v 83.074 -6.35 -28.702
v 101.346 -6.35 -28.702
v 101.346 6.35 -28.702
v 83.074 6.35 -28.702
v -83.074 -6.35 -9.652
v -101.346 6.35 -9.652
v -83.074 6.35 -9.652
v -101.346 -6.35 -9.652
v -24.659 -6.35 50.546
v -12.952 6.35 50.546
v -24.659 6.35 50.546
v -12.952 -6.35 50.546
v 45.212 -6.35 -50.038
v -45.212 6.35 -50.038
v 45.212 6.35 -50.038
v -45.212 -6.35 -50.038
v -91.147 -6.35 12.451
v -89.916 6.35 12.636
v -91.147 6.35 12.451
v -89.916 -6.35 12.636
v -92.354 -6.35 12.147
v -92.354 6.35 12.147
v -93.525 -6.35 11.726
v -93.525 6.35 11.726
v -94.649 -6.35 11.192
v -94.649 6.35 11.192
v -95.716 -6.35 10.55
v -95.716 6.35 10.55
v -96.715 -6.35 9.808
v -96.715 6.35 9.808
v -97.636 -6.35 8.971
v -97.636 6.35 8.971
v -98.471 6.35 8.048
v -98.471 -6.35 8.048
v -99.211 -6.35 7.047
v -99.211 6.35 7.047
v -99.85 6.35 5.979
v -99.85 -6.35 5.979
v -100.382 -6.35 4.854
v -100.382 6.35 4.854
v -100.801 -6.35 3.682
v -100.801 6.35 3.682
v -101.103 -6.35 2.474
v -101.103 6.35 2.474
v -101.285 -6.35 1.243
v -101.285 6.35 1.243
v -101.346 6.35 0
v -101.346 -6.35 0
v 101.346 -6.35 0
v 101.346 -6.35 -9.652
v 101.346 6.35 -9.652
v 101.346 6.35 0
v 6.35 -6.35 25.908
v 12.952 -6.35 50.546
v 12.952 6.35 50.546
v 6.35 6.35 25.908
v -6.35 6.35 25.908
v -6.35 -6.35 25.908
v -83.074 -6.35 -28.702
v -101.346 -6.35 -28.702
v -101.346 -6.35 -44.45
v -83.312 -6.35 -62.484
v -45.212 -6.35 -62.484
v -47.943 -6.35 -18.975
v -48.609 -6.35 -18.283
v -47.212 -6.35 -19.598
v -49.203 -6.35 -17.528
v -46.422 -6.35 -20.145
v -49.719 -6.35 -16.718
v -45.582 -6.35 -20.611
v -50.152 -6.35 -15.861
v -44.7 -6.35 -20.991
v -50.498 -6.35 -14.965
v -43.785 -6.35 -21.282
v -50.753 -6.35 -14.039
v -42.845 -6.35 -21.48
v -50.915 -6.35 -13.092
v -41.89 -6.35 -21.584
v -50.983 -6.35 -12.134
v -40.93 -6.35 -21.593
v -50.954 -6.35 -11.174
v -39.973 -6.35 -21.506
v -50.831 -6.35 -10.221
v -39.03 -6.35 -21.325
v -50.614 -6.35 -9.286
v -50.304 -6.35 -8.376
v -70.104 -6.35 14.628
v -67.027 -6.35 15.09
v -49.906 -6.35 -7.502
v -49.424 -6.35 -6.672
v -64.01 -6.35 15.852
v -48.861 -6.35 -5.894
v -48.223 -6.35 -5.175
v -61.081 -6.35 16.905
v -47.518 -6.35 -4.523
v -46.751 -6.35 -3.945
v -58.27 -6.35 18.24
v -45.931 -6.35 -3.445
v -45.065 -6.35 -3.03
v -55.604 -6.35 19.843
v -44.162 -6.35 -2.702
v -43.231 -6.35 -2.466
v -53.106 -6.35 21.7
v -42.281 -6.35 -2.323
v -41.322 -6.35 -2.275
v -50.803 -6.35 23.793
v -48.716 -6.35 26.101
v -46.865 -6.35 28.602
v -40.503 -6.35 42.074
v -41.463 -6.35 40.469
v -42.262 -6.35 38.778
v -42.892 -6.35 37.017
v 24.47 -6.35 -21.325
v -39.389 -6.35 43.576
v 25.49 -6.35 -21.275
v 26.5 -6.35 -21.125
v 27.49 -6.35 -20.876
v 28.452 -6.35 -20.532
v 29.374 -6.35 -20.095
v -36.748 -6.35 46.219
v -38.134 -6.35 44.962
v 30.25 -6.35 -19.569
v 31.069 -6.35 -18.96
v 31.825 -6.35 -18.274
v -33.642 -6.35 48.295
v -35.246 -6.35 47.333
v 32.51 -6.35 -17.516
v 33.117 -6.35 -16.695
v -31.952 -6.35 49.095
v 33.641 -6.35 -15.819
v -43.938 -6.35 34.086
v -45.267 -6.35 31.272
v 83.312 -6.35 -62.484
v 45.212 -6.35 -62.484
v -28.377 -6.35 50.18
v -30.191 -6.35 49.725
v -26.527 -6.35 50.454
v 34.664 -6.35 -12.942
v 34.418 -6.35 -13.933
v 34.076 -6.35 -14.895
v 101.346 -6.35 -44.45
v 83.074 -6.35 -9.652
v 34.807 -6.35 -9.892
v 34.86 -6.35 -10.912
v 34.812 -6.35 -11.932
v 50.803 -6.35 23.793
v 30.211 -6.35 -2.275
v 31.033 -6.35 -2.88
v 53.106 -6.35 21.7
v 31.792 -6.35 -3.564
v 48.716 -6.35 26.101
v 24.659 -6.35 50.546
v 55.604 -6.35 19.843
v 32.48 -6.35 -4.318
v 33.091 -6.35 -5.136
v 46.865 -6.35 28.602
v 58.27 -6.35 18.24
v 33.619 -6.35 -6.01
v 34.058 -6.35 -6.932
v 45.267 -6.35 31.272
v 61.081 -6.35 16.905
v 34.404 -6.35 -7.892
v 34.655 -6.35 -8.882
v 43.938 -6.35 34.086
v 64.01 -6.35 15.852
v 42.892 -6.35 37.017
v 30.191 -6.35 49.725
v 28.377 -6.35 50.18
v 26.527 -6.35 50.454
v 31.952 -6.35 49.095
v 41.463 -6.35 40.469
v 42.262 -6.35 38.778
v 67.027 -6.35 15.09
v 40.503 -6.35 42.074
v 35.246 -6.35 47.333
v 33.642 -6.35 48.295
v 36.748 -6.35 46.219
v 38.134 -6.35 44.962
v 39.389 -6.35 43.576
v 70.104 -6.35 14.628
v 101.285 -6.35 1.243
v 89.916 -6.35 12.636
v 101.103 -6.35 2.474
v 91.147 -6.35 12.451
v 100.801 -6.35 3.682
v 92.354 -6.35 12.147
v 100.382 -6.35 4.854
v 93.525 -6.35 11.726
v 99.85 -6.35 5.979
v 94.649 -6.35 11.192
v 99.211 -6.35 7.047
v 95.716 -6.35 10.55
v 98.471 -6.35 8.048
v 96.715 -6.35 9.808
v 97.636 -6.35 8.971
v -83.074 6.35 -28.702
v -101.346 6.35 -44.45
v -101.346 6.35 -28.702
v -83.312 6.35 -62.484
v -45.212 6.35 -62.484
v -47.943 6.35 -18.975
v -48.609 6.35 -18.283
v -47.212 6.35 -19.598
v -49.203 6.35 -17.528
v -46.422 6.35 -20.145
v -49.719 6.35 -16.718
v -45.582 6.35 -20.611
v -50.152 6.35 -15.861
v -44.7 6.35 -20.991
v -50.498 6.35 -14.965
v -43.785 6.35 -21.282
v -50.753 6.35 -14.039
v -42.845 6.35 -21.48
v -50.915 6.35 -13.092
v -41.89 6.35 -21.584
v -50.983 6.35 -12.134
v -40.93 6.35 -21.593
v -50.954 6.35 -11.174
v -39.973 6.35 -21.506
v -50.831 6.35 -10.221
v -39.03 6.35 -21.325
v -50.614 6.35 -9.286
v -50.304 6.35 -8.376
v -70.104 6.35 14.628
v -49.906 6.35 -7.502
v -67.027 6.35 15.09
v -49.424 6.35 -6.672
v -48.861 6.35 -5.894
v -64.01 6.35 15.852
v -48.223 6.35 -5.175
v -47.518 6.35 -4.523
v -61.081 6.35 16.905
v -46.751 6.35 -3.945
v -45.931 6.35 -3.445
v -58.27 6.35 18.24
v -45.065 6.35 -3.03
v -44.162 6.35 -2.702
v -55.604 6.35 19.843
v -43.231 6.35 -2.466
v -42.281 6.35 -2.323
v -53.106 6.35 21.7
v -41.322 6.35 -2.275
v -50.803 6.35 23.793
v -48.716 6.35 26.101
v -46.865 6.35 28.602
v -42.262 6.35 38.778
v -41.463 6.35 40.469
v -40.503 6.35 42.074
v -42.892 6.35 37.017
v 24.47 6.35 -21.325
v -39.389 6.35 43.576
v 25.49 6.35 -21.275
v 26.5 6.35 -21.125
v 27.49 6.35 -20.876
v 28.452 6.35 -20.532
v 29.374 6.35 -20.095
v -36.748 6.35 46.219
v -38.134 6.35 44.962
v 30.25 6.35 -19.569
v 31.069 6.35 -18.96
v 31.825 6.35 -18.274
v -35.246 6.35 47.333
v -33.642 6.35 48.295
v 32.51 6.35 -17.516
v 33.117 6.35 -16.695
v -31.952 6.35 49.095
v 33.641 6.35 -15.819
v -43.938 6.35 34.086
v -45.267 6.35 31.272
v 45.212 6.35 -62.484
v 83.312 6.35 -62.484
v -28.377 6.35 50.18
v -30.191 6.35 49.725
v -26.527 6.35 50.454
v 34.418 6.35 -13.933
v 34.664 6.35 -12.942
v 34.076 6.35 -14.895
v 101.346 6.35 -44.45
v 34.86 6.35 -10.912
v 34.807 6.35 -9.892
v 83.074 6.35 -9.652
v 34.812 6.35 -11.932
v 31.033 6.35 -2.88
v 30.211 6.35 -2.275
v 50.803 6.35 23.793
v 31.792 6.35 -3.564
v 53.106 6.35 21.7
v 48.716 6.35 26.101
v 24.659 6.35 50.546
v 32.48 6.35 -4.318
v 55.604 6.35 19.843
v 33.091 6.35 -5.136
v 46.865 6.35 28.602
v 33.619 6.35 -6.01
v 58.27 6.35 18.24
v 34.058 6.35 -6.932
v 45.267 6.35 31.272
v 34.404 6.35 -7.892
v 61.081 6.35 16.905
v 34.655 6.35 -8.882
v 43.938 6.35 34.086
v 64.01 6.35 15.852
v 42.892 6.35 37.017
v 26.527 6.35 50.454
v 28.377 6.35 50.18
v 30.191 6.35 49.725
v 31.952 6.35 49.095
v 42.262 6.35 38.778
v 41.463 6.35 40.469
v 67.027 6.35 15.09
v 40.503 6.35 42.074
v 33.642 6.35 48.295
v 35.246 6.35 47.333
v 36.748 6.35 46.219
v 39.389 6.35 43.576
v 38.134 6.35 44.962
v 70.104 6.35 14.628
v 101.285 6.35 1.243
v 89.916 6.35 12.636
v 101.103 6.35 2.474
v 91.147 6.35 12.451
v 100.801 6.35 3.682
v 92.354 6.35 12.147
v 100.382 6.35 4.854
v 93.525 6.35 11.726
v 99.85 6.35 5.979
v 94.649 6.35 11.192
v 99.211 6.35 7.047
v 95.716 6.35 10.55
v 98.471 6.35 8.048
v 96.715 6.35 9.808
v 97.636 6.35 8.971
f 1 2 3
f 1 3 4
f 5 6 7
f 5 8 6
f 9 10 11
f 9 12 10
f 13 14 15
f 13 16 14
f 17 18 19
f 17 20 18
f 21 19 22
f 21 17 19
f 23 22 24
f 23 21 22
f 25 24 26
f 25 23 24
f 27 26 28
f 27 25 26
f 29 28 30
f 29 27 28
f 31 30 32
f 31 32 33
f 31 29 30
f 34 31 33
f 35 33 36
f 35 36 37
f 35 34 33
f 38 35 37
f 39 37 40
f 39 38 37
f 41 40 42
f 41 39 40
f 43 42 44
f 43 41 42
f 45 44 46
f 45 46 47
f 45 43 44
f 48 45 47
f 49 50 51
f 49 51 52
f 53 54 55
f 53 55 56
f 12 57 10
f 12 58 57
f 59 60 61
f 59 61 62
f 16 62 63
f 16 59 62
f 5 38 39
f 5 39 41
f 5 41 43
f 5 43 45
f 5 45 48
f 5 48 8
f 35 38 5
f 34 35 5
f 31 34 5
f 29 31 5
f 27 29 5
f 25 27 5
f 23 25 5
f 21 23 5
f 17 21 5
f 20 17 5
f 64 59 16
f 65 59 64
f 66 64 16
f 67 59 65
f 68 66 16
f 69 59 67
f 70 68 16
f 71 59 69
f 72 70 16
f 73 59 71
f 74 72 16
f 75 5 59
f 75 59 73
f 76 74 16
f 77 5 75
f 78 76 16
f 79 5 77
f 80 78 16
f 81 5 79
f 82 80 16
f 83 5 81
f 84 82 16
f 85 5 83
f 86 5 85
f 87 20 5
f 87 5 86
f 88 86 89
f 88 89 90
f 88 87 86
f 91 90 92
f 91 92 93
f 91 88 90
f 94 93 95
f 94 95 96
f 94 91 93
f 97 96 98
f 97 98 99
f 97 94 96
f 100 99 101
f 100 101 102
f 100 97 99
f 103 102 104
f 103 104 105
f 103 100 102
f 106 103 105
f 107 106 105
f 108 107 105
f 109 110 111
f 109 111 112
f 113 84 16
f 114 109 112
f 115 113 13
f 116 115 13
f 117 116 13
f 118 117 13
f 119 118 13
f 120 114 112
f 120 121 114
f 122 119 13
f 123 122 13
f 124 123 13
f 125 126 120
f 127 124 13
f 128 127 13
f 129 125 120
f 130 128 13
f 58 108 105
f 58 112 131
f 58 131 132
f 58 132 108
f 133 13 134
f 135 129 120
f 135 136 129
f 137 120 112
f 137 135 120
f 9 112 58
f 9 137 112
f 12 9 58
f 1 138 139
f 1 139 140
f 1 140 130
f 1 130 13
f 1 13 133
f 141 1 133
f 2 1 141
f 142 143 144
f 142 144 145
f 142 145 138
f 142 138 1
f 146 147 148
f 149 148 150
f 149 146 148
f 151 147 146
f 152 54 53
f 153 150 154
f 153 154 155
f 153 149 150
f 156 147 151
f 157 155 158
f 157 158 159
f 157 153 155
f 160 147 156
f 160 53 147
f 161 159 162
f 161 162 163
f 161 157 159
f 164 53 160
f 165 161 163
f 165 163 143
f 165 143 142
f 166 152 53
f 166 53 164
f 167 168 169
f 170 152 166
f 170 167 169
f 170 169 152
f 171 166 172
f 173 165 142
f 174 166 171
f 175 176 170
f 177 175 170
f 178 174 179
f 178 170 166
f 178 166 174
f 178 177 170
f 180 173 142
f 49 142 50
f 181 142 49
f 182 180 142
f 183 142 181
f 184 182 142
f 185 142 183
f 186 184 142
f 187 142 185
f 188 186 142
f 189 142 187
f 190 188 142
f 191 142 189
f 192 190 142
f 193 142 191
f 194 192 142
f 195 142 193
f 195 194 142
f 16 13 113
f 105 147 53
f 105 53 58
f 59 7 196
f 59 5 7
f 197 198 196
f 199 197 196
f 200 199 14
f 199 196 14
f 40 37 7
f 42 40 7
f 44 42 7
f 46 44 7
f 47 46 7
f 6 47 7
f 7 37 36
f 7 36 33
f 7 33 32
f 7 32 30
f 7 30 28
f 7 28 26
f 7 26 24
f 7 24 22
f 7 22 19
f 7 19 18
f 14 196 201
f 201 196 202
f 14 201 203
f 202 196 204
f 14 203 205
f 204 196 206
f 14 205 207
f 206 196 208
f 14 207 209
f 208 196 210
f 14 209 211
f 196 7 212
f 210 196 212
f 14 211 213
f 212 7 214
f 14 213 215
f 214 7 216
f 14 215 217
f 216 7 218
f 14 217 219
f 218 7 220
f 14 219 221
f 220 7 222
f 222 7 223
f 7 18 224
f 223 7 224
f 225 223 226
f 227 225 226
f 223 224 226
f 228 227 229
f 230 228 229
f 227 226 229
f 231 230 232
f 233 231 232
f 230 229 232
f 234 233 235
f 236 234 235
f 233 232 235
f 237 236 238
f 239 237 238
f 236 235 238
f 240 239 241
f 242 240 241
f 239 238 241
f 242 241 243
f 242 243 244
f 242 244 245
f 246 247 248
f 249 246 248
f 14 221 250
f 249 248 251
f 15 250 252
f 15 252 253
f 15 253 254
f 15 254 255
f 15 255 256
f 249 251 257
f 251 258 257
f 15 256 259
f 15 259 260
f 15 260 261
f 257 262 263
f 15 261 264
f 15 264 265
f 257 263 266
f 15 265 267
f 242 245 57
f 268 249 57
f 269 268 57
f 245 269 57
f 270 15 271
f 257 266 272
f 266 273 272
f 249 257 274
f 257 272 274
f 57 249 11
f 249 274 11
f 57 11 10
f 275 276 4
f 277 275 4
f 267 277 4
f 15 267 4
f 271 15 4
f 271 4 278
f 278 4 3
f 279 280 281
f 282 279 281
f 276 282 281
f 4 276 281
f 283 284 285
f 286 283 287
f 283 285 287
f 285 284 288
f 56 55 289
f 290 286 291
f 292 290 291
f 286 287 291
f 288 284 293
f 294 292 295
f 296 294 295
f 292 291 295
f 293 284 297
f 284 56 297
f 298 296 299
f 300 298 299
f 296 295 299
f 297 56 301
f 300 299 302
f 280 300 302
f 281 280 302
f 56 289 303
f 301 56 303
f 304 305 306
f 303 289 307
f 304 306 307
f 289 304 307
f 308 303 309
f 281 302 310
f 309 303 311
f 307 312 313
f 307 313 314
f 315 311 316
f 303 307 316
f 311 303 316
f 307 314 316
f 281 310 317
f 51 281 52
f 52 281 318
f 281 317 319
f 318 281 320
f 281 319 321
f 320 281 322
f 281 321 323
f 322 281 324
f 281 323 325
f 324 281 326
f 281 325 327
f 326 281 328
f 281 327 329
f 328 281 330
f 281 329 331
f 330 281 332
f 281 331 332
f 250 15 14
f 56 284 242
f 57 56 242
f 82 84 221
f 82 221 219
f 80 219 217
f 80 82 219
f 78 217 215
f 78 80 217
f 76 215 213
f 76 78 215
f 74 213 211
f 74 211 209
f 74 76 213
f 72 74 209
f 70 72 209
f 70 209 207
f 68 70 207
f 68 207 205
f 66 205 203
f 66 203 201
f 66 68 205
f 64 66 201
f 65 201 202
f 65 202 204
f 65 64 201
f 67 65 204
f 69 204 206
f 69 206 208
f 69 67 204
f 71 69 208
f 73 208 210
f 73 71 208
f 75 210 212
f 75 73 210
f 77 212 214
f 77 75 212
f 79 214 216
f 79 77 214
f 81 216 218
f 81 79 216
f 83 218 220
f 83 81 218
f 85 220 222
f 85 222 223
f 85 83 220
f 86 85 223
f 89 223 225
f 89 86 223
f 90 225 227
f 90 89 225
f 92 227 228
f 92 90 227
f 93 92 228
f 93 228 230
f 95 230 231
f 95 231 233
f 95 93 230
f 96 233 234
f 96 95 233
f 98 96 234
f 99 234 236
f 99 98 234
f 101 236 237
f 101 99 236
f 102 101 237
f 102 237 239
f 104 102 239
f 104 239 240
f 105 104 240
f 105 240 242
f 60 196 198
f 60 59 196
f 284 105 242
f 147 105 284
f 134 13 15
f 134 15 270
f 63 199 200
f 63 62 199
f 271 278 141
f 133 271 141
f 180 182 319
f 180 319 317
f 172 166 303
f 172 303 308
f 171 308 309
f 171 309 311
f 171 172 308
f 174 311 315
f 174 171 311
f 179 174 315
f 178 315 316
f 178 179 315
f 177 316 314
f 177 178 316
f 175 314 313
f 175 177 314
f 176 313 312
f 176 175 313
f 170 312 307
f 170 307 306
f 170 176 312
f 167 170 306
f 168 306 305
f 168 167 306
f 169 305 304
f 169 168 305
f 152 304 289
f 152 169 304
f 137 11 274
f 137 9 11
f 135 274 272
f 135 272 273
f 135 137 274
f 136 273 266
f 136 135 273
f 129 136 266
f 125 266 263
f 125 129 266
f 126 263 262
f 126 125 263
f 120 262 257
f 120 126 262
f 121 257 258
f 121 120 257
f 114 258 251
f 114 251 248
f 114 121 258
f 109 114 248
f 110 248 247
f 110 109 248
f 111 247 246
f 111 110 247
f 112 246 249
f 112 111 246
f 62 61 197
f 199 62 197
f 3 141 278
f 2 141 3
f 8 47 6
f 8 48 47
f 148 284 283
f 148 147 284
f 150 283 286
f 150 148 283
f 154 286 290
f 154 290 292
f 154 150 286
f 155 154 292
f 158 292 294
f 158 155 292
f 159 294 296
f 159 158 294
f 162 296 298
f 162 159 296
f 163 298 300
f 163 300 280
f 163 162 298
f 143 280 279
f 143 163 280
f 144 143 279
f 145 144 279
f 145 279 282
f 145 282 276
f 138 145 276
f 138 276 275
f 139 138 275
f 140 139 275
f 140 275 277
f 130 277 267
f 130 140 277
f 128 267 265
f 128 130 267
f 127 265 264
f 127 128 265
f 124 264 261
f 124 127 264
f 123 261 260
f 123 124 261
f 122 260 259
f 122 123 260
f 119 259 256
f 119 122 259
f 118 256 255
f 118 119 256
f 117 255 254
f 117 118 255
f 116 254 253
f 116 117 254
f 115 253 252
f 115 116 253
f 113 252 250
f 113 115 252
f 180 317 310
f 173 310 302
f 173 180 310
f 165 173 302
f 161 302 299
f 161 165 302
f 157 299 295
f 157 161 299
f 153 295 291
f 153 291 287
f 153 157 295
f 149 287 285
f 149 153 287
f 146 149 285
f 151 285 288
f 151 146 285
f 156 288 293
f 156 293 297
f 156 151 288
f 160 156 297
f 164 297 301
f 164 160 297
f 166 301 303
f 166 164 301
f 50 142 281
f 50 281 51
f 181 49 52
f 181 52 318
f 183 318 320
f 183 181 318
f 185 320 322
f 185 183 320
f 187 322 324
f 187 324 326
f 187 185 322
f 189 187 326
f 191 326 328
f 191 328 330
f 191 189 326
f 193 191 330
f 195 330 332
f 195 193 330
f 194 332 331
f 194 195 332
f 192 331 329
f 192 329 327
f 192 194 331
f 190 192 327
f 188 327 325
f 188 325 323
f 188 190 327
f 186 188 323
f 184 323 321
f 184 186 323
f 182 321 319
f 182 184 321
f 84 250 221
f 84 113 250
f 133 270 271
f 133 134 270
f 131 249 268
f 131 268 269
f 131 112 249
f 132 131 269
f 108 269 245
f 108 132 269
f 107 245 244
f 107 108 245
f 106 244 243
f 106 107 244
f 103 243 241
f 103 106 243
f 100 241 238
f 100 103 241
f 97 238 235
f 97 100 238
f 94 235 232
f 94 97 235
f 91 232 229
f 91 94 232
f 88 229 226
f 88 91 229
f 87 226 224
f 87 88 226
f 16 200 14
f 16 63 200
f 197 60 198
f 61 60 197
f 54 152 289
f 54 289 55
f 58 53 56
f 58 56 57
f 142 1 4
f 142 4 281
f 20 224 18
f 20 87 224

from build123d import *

# Parameters (mm, degrees)
F1_DEPTH = 6.35
F2_SIZE  = 18.034


with BuildPart() as f1:
    # F0 (on Front) → F1 (new body, symmetric)
    with BuildSketch(Plane.XZ):
        with BuildLine():
            Line((-45.212, -50.038), (45.212, -50.038))
            Line((45.212, -50.038), (45.212, -62.484))
            Line((45.212, -62.484), (101.346, -62.484))
            Line((101.346, -62.484), (101.346, -28.702))
            Line((101.346, -28.702), (83.07388, -28.702))
            Line((83.07388, -28.702), (83.07388, -9.652))
            Line((83.07388, -9.652), (101.346, -9.652))
            Line((101.346, -9.652), (101.346, 0))
            ThreePointArc((101.346, 0), (98.064572, 8.519419), (89.916, 12.63634))
            Line((89.916, 12.63634), (70.104, 14.627521))
            ThreePointArc((70.104, 14.627521), (53.106495, 21.700368), (42.891581, 37.01689))
            ThreePointArc((42.891581, 37.01689), (36.010992, 46.794292), (24.65913, 50.546))
            Line((24.65913, 50.546), (12.951732, 50.546))
            Line((12.951732, 50.546), (6.35, 25.908))
            Line((6.35, 25.908), (-6.35, 25.908))
            Line((-6.35, 25.908), (-12.951732, 50.546))
            Line((-12.951732, 50.546), (-24.65913, 50.546))
            ThreePointArc((-24.65913, 50.546), (-36.010992, 46.794292), (-42.891581, 37.01689))
            ThreePointArc((-42.891581, 37.01689), (-53.106495, 21.700368), (-70.104, 14.627521))
            Line((-70.104, 14.627521), (-89.916, 12.63634))
            ThreePointArc((-89.916, 12.63634), (-98.064572, 8.519419), (-101.346, 0))
            Line((-101.346, 0), (-101.346, -9.652))
            Line((-101.346, -9.652), (-83.07388, -9.652))
            Line((-83.07388, -9.652), (-83.07388, -28.702))
            Line((-83.07388, -28.702), (-101.346, -28.702))
            Line((-101.346, -28.702), (-101.346, -62.484))
            Line((-101.346, -62.484), (-45.212, -62.484))
            Line((-45.212, -62.484), (-45.212, -50.038))
        make_face()
        with BuildLine():
            ThreePointArc((-39.029952, -21.325139), (-50.915473, -13.092182), (-41.32179, -2.275139))
            Line((-41.32179, -2.275139), (30.210615, -2.275139))
            ThreePointArc((30.210615, -2.275139), (34.418121, -13.932974), (24.470048, -21.325139))
            Line((24.470048, -21.325139), (-39.029952, -21.325139))
        make_face(mode=Mode.SUBTRACT)
    extrude(amount=F1_DEPTH, both=True)

    # F2
    f2_edges = [f1.edges().sort_by_distance(p)[0] for p in [
        (-101.346, 0, -62.484),
        (101.346, 0, -62.484),
    ]]
    chamfer(f2_edges, length=F2_SIZE)


solid = f1.part
